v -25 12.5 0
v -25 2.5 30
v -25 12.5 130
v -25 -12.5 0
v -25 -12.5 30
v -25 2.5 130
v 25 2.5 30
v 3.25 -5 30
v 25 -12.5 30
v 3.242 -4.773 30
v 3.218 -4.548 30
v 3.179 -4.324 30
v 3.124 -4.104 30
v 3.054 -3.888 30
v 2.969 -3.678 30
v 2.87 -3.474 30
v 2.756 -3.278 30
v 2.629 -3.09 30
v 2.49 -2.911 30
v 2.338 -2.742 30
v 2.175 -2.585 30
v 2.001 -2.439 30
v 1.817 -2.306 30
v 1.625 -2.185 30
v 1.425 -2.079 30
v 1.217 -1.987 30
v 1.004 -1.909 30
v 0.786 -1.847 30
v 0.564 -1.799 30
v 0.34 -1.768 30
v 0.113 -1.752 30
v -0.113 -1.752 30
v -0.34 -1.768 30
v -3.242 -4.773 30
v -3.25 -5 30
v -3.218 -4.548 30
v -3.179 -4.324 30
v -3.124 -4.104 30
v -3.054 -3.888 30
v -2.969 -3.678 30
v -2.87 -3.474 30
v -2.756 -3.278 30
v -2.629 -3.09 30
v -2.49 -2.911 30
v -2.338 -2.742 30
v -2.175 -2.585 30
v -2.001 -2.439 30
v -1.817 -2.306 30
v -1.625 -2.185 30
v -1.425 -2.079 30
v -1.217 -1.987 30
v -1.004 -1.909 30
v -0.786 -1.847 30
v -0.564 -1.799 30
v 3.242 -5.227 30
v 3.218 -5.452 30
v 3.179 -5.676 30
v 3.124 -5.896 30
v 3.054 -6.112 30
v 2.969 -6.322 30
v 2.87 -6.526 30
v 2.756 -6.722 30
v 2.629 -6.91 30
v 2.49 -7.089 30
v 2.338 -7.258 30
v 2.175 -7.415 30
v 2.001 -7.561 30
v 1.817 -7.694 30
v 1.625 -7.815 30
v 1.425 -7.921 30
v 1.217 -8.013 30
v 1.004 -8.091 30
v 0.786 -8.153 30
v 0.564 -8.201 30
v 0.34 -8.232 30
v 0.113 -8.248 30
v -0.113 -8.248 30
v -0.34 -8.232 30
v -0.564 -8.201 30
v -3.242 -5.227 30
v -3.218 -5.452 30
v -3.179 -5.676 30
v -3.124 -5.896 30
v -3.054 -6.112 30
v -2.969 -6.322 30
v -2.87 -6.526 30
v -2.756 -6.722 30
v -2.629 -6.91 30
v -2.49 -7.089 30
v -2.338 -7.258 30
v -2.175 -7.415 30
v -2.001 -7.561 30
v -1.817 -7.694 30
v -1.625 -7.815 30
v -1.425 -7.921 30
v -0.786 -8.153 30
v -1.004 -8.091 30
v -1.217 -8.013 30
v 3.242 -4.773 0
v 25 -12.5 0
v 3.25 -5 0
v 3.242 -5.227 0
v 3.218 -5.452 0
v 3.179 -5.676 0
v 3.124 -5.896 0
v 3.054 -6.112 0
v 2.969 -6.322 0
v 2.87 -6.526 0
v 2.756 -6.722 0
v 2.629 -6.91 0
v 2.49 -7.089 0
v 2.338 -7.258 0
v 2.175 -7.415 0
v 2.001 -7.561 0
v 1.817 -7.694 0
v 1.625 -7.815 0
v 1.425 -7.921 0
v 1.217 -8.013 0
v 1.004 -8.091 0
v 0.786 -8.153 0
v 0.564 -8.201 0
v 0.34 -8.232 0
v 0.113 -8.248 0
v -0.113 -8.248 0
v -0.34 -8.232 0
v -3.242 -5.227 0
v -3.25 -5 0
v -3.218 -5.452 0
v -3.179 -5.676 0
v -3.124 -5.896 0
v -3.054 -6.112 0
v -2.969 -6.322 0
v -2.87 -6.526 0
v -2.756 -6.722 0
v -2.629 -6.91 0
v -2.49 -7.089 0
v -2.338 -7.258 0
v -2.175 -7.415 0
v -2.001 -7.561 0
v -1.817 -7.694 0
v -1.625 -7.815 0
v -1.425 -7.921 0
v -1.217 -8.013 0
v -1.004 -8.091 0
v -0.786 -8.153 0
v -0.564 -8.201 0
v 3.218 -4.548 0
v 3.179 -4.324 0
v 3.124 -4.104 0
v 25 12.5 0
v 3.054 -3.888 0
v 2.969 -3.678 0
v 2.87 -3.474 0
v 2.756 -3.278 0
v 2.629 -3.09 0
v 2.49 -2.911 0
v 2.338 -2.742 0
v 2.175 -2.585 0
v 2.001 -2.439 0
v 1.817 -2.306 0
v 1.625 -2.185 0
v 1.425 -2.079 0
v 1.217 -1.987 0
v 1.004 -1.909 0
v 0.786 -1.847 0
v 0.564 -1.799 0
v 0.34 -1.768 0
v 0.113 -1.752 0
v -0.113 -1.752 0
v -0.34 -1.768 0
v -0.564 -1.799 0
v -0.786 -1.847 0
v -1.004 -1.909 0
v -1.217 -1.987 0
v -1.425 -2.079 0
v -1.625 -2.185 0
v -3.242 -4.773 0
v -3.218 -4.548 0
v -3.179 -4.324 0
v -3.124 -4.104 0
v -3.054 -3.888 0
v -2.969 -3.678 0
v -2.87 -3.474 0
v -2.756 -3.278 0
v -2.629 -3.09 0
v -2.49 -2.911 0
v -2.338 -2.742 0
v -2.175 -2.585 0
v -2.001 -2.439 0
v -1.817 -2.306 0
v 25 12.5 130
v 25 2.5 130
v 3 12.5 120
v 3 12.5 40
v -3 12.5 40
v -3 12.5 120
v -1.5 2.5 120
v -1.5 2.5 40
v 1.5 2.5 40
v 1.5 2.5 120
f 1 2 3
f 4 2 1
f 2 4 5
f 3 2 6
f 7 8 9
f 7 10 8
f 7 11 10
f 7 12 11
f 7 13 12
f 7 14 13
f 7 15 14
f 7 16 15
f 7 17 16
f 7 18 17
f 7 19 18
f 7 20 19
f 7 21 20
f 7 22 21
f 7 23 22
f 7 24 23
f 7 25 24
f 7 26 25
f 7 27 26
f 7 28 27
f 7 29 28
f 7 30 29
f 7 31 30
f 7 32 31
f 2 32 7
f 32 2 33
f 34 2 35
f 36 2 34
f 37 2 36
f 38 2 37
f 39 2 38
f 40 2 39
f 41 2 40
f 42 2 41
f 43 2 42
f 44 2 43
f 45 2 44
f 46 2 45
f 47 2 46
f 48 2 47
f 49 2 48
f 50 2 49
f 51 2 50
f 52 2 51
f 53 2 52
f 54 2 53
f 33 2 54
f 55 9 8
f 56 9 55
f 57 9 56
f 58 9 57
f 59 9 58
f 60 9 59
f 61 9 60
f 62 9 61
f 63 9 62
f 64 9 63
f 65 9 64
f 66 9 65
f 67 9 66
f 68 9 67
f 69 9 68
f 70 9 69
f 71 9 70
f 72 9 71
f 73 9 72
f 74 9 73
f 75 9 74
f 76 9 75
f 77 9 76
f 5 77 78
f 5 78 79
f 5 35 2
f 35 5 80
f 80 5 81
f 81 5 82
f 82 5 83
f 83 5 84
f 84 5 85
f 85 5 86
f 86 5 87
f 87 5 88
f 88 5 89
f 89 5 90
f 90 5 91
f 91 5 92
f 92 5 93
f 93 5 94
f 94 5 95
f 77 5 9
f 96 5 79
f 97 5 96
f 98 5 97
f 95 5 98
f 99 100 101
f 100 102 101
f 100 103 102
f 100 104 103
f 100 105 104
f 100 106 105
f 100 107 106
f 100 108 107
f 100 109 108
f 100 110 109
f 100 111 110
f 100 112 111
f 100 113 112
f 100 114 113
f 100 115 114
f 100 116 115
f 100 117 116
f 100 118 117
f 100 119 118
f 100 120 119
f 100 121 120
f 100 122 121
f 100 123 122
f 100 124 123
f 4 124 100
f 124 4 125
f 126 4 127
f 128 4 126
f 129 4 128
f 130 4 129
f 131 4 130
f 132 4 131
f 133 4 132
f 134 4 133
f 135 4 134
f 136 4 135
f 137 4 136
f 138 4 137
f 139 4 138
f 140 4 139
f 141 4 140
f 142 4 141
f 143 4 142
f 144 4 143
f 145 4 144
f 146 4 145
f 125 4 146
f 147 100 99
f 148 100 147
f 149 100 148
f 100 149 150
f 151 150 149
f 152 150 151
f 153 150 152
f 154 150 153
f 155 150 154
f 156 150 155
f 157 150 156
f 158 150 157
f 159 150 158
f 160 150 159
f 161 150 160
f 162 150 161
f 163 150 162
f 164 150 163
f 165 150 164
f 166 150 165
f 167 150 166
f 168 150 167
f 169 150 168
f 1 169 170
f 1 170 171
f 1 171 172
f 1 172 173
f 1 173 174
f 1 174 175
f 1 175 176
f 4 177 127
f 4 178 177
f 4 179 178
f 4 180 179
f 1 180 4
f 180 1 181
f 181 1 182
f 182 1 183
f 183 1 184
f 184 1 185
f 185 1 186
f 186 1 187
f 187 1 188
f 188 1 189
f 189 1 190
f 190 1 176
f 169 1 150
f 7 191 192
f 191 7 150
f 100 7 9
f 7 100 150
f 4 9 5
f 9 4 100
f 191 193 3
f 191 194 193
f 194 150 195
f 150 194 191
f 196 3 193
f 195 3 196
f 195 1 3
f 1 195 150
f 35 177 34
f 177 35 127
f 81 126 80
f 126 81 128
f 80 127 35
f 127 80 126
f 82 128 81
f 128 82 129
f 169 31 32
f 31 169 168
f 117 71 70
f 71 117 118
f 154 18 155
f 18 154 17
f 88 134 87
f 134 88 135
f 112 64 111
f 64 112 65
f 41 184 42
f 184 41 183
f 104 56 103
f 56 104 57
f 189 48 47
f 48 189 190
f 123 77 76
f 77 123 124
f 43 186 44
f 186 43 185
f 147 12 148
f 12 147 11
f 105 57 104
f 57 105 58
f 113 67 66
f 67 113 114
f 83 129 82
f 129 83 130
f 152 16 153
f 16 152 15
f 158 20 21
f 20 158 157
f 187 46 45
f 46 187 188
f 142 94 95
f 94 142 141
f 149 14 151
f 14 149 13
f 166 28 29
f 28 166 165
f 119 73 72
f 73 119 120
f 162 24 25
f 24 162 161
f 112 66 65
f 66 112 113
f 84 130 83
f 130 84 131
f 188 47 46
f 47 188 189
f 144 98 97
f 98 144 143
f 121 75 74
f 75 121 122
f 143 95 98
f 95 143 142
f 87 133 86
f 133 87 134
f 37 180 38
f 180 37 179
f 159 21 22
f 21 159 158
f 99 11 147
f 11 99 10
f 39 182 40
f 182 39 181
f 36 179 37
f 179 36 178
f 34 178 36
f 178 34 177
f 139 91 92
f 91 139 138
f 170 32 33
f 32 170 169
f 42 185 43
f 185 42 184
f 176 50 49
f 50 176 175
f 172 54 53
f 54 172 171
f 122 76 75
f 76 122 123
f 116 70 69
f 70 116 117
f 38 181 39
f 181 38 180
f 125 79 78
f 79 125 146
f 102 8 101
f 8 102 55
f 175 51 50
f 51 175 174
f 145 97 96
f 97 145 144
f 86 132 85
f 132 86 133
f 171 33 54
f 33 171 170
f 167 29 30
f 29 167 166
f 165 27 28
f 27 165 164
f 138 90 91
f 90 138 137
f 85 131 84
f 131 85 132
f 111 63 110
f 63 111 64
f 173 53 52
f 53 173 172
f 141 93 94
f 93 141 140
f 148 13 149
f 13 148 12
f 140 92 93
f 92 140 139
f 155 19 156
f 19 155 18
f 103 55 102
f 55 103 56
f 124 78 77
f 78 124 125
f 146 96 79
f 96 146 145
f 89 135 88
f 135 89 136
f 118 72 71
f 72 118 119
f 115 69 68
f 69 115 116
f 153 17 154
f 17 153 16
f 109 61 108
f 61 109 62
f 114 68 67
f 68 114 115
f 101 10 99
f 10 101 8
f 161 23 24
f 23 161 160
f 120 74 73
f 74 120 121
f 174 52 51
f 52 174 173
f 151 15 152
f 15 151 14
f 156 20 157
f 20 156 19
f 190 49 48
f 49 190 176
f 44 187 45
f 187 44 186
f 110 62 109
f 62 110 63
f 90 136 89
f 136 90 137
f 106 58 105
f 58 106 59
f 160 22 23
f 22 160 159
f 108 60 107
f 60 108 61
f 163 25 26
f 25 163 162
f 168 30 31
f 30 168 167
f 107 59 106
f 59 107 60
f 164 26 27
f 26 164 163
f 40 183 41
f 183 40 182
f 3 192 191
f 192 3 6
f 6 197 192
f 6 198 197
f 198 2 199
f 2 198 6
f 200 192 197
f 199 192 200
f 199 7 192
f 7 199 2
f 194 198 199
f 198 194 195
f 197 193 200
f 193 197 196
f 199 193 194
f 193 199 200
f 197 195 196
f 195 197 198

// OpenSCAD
x = 50;
y_block = 25;
z_block = 30;
y_plate = 10;
z_plate = 100;
z_plate_hole = 80;
wide_plate_hole = 6;
shallow_plate_hole = 3;
hole_offset = 10;
diameter = 6.5;

rotate(180) union() {
    block(x, y_block, z_block, hole_offset, diameter);
    translate([0, - y_block/2 + y_plate/2, z_block]) plate(x, y_plate, z_plate, wide_plate_hole, shallow_plate_hole, z_plate_hole);
}

module block(x = 50, y = 25, z = 30, of = 10, diameter = 6.5) {
    translate([0, -y / 2, 0]) difference() {
        translate([-x/2, 0, 0]) cube([x, y, z], false);
        translate([0, of + (y-of)/2, -z * 0.5]) cylinder($fn = 90, r = diameter / 2, h=z * 2, center=false);
    }
}

module plate(x = 50, y = 10, z = 100, wide = 6, shallow = 3, z_hole = 80) {
    difference() {
        translate([-x/2, -y/2, 0]) cube([x, y, z], center=false);
        rotate(180) translate([0, 0, (z - z_hole) / 2]) linear_extrude(z_hole) translate([-wide/2, y/2, 0]) polygon(points = [
            [0, 0],
            [0, y/2],
            [wide, y/2],
            [wide, 0],
            [wide/2 + shallow/2, -y],
            [wide/2 + shallow/2, -y * 1.5],
            [wide/2 - shallow/2, -y * 1.5],
            [wide/2 - shallow/2, -y]
        ]);
    }
}
